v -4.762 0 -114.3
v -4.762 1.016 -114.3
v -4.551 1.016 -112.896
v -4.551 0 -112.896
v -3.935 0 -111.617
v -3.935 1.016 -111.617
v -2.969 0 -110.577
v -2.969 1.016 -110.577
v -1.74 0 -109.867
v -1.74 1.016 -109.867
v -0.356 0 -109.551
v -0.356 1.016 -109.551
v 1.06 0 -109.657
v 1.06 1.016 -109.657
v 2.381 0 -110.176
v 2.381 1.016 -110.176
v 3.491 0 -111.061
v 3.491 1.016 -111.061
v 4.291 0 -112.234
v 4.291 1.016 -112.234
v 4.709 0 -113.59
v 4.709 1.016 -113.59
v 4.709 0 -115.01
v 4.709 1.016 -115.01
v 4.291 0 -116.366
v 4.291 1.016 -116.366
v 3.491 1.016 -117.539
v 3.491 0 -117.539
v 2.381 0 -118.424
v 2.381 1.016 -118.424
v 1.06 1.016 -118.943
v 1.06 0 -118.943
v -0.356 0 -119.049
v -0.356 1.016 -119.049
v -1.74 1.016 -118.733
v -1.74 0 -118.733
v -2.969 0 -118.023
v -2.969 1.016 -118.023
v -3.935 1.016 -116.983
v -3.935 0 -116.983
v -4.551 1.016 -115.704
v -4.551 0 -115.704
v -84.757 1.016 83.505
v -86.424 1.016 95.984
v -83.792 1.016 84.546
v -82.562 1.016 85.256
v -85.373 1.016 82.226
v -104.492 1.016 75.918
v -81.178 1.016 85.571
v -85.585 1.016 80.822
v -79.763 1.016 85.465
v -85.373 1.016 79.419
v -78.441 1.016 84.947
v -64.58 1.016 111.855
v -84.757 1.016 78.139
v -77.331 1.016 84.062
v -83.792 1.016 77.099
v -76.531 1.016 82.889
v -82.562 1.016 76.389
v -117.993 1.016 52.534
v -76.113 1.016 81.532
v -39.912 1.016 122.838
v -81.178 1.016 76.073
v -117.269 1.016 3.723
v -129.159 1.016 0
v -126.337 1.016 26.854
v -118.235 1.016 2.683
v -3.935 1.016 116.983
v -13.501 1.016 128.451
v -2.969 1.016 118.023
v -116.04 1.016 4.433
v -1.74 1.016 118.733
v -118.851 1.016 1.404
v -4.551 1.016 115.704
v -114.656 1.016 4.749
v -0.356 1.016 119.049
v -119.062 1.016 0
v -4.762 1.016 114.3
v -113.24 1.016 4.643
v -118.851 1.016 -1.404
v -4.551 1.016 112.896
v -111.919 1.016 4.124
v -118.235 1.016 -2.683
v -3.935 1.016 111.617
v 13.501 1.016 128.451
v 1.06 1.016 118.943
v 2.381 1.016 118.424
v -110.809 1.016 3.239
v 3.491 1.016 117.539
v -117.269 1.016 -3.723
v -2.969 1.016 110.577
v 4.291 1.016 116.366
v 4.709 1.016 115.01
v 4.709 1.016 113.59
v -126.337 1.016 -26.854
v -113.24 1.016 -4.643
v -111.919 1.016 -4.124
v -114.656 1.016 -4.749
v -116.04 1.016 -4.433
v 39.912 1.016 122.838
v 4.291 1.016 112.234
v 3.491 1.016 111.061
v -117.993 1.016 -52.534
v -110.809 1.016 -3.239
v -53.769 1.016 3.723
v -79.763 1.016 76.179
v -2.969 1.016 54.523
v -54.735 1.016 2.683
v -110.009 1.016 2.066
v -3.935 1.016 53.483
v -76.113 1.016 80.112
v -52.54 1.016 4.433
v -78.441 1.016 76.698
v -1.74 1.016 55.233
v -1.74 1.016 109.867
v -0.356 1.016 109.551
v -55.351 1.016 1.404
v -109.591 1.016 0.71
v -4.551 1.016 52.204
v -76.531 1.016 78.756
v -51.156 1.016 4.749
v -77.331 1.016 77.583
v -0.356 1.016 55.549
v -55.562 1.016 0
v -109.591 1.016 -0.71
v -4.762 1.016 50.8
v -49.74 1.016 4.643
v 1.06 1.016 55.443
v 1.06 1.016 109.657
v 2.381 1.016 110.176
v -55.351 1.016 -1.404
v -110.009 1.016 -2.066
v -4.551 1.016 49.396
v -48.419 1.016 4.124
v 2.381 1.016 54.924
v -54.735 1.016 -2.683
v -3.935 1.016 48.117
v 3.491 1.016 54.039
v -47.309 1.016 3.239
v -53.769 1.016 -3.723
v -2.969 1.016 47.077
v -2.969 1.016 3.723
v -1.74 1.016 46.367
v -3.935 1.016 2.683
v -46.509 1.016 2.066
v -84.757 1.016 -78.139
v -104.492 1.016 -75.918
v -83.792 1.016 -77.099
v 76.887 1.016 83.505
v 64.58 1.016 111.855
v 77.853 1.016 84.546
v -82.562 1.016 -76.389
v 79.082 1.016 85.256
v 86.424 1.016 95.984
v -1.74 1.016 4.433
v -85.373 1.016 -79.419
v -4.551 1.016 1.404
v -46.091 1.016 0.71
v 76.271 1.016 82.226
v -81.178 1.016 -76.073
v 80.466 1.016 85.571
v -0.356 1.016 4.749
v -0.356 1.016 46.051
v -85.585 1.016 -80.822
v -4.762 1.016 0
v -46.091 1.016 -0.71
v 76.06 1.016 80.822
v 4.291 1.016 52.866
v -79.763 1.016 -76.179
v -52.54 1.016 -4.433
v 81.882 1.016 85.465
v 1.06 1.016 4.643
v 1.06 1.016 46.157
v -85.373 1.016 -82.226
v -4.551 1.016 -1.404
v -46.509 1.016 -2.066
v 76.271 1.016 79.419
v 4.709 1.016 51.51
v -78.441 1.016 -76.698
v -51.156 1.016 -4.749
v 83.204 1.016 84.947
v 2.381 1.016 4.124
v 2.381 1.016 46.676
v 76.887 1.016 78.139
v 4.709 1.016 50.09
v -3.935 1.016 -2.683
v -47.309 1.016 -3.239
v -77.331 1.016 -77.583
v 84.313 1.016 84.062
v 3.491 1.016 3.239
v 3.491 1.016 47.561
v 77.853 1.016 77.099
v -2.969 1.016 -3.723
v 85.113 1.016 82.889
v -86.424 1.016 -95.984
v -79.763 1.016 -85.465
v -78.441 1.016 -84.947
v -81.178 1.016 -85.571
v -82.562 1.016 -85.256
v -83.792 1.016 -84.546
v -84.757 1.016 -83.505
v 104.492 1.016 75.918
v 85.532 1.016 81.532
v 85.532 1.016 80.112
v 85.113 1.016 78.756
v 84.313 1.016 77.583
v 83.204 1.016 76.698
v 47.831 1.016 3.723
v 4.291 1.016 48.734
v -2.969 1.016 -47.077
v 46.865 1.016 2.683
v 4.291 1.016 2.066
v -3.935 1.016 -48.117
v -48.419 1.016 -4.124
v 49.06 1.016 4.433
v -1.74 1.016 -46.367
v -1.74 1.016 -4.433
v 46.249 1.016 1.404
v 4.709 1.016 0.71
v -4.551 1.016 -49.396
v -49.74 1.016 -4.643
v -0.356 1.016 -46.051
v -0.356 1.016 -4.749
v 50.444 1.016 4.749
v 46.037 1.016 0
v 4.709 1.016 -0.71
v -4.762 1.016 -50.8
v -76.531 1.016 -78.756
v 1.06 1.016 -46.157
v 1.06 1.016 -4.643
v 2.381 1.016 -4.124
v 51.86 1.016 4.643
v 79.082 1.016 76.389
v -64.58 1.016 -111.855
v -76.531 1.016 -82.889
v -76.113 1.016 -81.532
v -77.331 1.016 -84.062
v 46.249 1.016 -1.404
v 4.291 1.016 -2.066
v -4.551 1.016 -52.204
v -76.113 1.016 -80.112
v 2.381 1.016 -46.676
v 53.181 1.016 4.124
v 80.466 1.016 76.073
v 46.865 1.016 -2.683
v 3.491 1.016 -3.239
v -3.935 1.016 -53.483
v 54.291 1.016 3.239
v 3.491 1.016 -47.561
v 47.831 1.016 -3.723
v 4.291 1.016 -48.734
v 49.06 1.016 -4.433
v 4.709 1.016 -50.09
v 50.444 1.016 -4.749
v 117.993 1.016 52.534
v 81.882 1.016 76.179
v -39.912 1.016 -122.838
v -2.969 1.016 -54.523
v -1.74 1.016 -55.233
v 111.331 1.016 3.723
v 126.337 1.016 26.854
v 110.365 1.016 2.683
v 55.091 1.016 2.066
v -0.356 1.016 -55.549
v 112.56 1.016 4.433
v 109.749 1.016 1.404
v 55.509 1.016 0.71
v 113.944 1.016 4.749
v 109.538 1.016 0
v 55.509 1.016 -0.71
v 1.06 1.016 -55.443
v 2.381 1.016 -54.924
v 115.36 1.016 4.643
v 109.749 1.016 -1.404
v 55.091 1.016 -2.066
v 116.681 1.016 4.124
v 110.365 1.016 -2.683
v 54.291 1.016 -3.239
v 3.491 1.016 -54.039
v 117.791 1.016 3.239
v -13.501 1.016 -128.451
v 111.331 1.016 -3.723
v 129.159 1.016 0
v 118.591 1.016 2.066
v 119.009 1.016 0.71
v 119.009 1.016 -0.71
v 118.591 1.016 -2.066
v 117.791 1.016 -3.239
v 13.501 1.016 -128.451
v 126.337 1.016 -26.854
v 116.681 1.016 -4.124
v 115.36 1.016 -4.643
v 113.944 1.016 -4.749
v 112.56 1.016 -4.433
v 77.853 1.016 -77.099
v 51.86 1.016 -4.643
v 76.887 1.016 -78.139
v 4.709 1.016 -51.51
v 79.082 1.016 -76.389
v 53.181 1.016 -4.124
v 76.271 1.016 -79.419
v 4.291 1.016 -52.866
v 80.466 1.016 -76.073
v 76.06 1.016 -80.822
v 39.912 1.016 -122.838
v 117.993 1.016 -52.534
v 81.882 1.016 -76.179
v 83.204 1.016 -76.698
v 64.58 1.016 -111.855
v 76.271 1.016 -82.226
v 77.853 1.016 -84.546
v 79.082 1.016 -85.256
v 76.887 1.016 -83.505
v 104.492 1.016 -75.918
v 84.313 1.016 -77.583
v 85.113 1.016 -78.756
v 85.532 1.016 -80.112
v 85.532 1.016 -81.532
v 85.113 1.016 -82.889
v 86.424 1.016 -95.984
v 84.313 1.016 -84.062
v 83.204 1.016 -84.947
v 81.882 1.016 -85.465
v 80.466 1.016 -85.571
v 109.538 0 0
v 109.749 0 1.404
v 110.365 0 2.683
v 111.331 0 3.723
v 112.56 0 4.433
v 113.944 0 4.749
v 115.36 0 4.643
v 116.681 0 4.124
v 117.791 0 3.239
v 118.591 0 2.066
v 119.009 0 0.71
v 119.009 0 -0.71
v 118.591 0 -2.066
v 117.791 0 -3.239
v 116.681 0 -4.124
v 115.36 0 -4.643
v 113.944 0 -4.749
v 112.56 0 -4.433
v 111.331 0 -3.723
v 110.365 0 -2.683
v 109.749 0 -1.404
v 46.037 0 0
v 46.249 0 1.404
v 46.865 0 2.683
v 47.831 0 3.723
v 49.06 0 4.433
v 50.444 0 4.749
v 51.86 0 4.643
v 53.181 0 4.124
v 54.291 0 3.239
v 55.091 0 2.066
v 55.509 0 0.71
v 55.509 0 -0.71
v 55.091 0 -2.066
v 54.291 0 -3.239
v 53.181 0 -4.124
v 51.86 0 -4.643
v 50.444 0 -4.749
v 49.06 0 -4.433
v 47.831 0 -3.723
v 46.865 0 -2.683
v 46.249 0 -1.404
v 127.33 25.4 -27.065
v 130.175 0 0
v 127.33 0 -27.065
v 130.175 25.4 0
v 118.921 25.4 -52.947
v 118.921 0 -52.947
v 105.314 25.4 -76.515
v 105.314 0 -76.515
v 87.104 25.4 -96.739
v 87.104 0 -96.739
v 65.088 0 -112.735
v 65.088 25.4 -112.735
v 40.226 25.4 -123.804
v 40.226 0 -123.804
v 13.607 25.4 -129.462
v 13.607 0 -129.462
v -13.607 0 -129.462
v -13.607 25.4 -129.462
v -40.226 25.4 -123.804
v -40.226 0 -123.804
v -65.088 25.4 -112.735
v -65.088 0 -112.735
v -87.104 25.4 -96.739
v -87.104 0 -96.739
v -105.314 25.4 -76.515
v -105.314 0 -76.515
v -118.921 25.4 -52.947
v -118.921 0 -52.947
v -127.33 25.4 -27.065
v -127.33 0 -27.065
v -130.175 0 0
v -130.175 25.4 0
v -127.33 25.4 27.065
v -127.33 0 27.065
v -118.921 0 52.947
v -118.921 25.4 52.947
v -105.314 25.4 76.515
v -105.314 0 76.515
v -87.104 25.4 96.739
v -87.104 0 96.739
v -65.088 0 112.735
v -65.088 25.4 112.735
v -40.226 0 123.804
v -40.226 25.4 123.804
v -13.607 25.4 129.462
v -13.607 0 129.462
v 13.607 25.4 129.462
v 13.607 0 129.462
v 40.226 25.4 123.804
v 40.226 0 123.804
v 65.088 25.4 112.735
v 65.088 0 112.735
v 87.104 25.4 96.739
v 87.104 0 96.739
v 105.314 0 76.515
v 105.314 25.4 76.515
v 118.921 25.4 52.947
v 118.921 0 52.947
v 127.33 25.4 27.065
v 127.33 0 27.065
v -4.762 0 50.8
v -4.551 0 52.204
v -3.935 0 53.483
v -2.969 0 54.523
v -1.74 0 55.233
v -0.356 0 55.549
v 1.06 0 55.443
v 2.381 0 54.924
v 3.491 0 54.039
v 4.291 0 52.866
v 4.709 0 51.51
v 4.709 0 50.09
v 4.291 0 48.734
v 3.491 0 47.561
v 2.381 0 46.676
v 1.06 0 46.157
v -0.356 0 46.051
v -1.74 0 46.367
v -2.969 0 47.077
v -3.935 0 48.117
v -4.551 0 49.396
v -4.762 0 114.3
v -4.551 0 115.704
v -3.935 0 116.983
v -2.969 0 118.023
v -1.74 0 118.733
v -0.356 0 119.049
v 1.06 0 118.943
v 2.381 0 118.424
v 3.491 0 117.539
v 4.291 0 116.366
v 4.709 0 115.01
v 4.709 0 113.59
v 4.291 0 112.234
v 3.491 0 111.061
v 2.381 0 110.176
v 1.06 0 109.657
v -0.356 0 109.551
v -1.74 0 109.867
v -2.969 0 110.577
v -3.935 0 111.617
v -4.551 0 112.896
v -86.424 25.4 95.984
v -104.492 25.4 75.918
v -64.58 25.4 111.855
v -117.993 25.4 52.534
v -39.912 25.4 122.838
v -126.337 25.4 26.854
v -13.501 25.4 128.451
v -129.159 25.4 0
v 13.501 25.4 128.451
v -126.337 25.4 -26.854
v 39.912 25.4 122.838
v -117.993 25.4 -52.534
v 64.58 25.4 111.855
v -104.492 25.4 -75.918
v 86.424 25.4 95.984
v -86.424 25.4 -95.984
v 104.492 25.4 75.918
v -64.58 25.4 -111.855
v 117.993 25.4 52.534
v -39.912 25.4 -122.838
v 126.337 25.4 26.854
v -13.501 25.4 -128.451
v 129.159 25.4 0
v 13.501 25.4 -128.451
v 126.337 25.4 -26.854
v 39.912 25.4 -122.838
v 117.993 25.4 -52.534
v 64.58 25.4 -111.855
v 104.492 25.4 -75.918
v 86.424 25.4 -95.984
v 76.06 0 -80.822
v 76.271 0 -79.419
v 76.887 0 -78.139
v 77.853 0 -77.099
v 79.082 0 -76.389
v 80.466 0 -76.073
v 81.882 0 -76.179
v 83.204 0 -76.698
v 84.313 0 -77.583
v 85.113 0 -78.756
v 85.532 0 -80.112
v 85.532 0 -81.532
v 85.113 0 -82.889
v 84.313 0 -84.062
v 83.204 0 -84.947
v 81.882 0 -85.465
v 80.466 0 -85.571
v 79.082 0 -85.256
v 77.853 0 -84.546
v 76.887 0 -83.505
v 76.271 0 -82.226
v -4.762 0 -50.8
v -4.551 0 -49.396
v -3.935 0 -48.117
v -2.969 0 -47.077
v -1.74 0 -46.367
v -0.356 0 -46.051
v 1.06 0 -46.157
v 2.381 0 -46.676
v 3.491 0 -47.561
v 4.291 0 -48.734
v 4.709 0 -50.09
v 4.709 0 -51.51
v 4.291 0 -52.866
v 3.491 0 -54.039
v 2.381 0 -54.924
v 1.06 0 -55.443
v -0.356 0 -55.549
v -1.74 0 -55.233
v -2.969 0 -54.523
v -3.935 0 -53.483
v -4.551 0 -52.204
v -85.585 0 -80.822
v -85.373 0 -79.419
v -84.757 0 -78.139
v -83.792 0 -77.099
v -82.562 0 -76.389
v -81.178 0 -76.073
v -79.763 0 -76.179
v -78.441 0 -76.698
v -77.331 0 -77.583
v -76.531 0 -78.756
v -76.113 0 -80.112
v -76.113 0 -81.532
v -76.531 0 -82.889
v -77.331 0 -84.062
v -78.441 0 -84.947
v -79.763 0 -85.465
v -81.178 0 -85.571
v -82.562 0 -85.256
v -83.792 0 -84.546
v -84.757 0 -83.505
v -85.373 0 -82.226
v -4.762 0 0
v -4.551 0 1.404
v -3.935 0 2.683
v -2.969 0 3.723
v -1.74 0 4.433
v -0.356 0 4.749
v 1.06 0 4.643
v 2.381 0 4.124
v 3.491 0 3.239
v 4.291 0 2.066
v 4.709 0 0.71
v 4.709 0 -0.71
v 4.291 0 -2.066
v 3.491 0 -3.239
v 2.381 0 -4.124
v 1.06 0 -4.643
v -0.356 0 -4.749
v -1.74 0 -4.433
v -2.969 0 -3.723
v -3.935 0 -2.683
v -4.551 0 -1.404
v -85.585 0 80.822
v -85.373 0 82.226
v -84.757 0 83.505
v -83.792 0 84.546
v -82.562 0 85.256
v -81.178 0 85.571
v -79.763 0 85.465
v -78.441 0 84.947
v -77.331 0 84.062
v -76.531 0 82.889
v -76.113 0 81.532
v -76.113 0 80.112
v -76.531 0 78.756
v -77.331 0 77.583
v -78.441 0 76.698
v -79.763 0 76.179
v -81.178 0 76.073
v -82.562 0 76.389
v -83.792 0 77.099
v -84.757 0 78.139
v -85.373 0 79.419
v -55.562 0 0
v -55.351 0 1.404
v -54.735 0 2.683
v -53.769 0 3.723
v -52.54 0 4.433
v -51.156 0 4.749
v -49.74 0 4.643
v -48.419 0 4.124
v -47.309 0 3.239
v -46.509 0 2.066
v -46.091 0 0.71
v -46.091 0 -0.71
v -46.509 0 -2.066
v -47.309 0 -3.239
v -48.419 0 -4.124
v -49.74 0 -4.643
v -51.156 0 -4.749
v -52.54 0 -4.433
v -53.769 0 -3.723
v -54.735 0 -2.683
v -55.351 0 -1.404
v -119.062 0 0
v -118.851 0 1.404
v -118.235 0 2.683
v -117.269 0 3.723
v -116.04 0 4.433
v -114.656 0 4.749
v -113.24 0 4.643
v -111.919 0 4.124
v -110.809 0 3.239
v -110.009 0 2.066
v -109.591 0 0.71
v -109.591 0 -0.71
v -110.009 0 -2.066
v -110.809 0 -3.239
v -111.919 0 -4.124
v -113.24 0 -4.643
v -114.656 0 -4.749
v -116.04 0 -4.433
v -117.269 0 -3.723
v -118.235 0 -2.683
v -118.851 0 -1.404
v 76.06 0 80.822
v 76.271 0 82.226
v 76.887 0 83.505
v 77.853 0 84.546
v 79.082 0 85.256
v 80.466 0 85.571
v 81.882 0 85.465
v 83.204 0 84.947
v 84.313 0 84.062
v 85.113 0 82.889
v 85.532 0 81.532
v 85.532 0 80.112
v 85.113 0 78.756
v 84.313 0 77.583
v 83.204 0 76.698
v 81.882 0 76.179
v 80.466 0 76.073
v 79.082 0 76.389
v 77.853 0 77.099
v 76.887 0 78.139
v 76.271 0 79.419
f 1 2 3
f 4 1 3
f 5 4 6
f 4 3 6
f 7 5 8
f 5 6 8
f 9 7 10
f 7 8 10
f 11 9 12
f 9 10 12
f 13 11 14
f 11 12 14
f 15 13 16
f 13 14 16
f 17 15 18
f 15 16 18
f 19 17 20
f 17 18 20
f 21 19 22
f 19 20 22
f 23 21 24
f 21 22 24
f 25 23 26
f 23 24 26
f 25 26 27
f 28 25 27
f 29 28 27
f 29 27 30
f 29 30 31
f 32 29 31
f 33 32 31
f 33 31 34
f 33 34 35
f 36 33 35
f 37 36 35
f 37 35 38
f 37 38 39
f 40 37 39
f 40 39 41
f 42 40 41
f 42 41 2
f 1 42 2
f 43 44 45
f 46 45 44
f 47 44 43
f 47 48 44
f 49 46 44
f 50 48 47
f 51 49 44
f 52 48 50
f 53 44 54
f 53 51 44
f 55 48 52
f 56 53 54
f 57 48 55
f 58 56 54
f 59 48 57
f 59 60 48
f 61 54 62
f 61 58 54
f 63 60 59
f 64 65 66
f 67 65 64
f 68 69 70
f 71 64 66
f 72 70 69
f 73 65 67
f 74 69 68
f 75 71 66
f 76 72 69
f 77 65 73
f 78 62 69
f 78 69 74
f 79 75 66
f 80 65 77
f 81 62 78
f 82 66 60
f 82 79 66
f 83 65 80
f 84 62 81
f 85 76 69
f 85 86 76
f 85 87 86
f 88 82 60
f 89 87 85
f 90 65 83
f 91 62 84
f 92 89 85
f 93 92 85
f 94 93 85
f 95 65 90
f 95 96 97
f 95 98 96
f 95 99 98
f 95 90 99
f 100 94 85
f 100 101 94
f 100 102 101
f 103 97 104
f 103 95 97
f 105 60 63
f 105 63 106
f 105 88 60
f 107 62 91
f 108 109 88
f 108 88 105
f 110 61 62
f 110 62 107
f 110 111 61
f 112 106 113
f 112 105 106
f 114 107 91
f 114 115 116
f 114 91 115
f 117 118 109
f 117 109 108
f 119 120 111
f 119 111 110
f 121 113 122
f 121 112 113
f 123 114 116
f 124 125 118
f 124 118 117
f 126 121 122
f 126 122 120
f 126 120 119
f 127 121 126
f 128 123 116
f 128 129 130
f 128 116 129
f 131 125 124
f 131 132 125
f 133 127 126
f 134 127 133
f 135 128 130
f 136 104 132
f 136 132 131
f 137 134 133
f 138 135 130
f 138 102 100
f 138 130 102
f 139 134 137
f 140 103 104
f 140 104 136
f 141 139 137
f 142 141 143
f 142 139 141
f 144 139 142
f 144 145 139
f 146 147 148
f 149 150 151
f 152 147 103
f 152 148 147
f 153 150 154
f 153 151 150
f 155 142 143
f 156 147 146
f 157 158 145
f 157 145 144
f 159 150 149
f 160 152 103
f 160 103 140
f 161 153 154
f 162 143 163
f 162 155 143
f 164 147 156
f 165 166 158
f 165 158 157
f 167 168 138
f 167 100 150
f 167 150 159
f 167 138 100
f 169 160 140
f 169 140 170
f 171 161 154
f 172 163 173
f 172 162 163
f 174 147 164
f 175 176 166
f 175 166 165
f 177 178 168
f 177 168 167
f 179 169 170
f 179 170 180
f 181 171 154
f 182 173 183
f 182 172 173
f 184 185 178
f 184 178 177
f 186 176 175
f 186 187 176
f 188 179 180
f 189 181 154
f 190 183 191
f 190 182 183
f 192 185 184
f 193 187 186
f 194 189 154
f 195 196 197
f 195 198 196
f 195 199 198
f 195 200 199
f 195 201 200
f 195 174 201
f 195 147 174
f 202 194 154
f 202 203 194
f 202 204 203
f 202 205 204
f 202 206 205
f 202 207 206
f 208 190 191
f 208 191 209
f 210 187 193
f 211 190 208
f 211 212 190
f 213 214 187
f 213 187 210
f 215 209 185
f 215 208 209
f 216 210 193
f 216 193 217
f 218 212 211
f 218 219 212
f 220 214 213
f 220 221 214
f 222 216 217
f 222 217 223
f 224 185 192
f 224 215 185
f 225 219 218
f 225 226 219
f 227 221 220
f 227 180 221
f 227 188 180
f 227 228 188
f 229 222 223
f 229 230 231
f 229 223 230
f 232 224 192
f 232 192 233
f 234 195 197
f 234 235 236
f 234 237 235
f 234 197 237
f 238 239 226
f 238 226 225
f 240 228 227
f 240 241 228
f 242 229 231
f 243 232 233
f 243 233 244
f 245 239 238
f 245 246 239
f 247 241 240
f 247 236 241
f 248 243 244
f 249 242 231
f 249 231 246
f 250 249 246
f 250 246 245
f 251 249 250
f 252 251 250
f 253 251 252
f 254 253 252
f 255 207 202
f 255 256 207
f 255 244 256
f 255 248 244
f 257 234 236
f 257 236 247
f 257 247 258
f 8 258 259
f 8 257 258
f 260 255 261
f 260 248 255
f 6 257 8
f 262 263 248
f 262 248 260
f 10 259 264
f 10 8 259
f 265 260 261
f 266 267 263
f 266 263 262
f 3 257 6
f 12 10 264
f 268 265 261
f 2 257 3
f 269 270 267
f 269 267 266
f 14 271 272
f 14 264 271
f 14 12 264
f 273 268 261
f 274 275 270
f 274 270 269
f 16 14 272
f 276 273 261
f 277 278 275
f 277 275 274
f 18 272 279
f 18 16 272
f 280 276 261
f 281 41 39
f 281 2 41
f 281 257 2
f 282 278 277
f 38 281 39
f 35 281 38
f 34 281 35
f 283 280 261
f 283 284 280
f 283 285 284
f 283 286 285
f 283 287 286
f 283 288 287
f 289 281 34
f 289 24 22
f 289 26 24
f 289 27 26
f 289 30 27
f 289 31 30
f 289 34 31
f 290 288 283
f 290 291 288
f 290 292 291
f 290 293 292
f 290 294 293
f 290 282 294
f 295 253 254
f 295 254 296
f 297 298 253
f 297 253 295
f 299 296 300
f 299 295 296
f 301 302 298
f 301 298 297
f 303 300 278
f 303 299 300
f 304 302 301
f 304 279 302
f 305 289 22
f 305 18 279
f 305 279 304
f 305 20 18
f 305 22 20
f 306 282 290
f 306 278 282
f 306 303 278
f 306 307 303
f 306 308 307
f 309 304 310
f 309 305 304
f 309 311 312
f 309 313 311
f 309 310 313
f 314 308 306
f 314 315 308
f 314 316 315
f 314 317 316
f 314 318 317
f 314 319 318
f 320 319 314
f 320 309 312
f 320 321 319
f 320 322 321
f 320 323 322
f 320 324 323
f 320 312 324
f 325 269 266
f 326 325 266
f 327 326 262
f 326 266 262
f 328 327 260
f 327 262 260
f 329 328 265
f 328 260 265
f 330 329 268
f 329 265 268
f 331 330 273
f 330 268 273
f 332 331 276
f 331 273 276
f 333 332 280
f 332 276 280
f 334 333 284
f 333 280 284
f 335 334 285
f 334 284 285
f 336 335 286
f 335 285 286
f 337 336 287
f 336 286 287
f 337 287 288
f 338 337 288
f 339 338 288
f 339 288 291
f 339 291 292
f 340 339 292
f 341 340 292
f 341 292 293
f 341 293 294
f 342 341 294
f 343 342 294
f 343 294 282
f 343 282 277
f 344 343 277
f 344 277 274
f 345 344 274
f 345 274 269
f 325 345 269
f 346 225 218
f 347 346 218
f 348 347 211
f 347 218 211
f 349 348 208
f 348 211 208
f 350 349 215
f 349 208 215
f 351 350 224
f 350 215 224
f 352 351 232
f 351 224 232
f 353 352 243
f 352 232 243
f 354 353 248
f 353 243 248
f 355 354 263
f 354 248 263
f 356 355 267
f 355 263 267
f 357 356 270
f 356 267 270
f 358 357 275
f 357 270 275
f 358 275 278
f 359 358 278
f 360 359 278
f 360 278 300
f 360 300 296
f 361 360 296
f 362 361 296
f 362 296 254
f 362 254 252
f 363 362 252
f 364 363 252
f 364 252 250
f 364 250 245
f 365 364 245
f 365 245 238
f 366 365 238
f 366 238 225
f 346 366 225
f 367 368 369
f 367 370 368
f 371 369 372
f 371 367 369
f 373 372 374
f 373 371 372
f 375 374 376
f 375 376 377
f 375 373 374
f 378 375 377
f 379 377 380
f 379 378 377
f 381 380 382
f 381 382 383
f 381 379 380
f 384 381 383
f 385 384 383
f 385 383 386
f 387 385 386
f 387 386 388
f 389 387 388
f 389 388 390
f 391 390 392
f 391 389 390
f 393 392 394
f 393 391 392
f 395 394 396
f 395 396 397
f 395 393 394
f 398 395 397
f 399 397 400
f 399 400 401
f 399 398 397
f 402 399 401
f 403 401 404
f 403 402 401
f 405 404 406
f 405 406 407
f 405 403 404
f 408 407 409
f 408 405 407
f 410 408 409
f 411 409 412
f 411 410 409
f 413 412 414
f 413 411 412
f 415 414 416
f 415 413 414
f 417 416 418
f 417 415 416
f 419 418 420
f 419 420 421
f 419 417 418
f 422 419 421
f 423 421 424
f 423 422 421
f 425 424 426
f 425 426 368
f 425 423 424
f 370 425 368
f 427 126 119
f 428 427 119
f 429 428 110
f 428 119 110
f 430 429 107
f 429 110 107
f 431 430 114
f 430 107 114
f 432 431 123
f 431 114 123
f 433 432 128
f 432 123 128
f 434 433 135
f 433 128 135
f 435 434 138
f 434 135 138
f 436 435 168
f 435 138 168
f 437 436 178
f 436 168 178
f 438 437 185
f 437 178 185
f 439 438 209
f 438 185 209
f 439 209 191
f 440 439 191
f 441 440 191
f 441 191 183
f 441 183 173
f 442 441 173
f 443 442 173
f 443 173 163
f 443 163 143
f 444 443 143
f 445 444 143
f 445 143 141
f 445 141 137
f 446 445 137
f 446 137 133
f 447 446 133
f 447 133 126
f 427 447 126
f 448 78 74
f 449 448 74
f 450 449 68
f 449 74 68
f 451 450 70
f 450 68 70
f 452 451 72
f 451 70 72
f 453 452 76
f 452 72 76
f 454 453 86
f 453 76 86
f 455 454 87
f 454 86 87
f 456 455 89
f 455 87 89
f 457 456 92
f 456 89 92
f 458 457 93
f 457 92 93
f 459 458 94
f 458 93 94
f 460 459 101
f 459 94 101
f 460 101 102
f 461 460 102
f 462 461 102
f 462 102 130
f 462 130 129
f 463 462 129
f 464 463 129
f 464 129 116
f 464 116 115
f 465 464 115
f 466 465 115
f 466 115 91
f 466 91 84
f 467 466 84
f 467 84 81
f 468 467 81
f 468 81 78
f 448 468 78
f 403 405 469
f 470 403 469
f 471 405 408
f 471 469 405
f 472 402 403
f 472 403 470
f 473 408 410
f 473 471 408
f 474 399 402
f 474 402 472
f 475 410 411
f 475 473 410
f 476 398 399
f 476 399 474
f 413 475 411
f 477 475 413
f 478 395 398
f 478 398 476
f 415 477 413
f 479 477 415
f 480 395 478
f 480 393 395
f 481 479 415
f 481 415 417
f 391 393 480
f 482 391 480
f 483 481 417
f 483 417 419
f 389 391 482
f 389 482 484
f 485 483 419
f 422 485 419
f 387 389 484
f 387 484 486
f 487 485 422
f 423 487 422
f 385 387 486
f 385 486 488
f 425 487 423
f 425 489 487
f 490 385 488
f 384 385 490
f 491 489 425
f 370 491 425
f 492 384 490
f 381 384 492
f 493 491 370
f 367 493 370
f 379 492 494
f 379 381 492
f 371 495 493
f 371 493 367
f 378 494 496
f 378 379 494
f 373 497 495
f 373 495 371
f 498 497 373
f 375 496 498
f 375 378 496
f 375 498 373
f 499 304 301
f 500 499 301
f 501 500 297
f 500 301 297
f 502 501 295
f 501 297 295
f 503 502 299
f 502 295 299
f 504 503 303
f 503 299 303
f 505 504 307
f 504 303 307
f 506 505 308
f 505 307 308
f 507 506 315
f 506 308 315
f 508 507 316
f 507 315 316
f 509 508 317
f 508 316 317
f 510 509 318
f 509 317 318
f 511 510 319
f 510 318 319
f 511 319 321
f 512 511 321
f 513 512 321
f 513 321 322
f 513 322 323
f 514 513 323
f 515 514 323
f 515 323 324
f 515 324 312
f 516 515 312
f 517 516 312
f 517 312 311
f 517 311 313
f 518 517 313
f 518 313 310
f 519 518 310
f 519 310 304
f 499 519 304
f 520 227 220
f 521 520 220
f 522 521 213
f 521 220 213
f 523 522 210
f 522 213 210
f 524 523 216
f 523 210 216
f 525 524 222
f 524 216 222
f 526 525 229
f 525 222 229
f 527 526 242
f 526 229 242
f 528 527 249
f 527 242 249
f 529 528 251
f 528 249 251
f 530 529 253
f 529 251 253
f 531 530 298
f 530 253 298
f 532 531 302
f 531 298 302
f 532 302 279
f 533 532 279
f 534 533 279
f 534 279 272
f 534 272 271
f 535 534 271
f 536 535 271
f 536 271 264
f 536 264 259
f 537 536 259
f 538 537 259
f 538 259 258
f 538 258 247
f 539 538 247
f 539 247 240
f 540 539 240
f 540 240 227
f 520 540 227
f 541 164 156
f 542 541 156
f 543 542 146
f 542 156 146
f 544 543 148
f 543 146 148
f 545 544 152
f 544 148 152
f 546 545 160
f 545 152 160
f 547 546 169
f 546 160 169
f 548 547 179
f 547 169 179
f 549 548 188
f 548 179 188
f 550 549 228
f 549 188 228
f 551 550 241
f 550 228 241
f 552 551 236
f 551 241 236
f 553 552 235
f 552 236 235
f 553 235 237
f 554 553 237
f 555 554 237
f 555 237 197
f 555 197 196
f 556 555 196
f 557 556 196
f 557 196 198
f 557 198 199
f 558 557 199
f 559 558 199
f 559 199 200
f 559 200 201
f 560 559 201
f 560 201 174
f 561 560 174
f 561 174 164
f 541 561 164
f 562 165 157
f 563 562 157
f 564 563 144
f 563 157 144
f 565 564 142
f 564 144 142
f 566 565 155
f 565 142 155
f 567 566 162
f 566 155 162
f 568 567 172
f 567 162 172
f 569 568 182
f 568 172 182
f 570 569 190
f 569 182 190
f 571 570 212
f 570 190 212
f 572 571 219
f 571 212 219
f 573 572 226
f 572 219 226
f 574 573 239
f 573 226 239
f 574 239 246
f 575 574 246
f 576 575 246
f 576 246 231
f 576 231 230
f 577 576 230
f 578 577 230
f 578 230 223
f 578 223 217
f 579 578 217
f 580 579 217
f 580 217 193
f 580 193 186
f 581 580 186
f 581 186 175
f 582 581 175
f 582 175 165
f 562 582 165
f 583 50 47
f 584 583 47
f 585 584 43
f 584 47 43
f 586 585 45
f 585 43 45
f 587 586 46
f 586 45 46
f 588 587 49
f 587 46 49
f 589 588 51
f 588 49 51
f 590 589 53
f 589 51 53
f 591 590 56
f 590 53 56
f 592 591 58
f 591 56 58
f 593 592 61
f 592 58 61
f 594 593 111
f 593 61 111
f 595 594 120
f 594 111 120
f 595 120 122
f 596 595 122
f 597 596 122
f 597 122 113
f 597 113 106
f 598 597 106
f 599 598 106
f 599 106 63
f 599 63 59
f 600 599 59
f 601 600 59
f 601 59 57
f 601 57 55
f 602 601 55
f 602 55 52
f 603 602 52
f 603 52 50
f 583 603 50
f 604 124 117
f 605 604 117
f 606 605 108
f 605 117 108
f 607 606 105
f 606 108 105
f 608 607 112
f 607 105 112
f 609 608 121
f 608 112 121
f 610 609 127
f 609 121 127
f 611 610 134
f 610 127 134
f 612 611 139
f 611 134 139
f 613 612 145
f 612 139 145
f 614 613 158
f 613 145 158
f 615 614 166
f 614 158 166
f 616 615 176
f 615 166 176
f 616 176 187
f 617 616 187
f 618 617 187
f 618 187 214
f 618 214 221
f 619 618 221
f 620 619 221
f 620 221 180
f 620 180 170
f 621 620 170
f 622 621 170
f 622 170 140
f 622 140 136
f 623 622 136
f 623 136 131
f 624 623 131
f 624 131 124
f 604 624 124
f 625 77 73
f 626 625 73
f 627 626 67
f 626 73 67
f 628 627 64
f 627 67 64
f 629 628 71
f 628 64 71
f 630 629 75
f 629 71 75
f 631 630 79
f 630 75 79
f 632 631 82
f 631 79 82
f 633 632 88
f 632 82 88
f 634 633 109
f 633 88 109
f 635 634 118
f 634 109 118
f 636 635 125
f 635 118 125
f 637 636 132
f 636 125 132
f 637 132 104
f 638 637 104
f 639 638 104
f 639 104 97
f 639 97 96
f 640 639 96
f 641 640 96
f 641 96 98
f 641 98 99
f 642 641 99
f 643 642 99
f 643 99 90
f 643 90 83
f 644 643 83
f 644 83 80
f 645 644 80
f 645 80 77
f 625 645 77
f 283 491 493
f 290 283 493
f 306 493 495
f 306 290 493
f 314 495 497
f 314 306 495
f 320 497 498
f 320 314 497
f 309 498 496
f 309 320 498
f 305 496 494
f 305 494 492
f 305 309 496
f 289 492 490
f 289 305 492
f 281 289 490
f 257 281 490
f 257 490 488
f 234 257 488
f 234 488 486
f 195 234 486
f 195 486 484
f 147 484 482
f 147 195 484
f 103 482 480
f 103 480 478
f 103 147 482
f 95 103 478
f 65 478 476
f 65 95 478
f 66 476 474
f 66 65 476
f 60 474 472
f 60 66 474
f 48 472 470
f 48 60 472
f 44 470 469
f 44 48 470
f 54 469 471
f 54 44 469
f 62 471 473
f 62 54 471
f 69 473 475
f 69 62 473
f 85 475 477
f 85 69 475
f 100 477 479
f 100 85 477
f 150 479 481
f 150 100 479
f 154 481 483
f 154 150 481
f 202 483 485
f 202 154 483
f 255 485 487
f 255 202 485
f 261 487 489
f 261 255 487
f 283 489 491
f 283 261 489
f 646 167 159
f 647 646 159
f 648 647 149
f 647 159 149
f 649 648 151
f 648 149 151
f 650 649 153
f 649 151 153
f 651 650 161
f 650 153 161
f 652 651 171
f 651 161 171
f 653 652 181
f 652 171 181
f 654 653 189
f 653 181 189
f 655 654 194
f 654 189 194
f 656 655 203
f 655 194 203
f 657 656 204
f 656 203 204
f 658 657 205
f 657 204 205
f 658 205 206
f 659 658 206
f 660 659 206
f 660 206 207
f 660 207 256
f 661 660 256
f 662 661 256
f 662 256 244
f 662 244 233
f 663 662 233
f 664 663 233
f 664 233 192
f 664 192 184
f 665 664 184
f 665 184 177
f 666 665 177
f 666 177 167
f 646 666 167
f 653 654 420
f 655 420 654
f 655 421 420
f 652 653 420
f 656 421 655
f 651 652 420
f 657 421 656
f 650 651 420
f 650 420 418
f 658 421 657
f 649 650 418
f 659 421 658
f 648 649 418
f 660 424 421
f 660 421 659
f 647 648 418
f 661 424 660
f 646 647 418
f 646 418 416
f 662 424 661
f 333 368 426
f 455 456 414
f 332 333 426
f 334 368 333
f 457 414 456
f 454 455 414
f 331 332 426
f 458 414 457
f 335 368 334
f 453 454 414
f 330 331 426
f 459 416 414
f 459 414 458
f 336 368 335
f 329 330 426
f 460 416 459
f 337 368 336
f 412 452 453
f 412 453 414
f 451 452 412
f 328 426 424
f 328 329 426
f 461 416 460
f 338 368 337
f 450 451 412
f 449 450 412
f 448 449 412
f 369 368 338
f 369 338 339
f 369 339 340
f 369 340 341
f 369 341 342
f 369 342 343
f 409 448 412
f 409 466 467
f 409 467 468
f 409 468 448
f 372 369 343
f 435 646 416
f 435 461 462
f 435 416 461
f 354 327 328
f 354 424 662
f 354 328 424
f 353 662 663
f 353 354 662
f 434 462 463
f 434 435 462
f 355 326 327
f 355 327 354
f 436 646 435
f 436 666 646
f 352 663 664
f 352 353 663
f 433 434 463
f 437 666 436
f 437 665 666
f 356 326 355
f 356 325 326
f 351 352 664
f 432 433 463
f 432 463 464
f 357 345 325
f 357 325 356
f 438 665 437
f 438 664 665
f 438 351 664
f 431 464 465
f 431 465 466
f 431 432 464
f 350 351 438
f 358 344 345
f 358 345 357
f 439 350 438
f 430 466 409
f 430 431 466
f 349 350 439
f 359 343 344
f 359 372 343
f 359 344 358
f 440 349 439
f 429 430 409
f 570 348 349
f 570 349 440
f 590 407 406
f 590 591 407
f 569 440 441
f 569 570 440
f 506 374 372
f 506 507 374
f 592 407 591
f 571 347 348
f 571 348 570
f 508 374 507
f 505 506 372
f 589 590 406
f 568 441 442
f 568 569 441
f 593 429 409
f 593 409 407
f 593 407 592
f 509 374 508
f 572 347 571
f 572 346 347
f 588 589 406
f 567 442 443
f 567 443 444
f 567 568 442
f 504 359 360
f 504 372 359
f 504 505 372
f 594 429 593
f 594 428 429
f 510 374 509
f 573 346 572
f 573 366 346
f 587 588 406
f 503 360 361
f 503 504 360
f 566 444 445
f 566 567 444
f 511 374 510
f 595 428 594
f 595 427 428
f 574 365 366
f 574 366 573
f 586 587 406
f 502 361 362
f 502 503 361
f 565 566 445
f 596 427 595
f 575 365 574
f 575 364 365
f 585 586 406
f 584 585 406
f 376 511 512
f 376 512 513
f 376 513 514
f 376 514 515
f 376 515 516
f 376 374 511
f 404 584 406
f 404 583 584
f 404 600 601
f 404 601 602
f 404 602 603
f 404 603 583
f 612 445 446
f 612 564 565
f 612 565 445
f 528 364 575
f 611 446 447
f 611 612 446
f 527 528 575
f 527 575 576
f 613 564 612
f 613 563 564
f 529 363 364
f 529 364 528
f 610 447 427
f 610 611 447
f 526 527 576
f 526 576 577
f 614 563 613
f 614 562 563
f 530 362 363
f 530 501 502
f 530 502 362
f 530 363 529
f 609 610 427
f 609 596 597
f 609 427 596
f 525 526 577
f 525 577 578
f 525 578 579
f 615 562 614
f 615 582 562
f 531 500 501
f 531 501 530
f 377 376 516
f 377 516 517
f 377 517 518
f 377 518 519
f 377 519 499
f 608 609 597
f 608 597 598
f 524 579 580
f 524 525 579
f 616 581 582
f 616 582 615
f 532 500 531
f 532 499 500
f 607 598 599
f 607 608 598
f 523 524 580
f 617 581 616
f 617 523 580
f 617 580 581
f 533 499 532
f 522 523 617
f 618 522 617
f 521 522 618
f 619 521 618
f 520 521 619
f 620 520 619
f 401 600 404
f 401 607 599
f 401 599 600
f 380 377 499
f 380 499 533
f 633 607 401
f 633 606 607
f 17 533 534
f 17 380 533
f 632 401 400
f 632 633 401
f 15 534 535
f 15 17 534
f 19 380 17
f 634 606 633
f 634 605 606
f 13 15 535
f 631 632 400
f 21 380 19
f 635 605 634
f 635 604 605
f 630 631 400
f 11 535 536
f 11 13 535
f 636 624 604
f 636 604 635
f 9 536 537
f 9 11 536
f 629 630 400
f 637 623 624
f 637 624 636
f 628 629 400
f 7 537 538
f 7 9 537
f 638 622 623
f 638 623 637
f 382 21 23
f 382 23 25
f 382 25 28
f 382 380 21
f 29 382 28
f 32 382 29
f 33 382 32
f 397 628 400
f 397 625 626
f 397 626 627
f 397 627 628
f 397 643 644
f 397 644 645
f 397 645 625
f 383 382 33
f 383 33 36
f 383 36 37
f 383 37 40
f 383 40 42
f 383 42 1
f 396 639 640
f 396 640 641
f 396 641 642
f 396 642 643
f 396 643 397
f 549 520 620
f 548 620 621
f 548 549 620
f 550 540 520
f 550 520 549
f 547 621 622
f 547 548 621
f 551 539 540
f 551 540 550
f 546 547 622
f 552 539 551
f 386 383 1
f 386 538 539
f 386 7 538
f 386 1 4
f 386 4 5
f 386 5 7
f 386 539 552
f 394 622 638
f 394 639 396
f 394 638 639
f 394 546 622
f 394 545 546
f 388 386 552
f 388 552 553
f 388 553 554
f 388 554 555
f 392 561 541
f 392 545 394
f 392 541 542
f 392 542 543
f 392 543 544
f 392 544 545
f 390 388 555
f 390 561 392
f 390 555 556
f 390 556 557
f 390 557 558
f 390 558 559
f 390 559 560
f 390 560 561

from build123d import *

# Parameters (mm, degrees)
F2_R     = 4.7625
F3_DEPTH = 1.017


with BuildPart() as f1:
    # F0 (on Top) → F1 (revolve)
    with BuildSketch(Plane.XY):
        Polygon((0, 1.016), (0, 0), (130.175, 0), (130.175, 25.4), (129.159, 25.4), (129.159, 1.016), align=None)
    revolve(axis=Axis((0, 0.508, 0), (0, 1, 0)))

    # F2 (on face) → F3 (cut, through all)
    with BuildSketch(Plane(origin=(0, 1.016, 0), x_dir=(-1, 0, 0), z_dir=(0, 1, 0))):
        Circle(F2_R)
        with Locations((0, -50.8)):
            Circle(F2_R)
        with Locations((0, -114.3)):
            Circle(F2_R)
        with Locations((-50.8, 0)):
            Circle(F2_R)
        with Locations((0, 50.8)):
            Circle(F2_R)
        with Locations((-80.822305, 80.822305)):
            Circle(F2_R)
        with Locations((80.822305, 80.822305)):
            Circle(F2_R)
        with Locations((114.3, 0)):
            Circle(F2_R)
        with Locations((80.822305, -80.822305)):
            Circle(F2_R)
        with Locations((-80.822305, -80.822305)):
            Circle(F2_R)
        with Locations((0, 114.3)):
            Circle(F2_R)
        with Locations((50.8, 0)):
            Circle(F2_R)
        with Locations((-114.3, 0)):
            Circle(F2_R)
    extrude(amount=-F3_DEPTH, mode=Mode.SUBTRACT)


solid = f1.part
